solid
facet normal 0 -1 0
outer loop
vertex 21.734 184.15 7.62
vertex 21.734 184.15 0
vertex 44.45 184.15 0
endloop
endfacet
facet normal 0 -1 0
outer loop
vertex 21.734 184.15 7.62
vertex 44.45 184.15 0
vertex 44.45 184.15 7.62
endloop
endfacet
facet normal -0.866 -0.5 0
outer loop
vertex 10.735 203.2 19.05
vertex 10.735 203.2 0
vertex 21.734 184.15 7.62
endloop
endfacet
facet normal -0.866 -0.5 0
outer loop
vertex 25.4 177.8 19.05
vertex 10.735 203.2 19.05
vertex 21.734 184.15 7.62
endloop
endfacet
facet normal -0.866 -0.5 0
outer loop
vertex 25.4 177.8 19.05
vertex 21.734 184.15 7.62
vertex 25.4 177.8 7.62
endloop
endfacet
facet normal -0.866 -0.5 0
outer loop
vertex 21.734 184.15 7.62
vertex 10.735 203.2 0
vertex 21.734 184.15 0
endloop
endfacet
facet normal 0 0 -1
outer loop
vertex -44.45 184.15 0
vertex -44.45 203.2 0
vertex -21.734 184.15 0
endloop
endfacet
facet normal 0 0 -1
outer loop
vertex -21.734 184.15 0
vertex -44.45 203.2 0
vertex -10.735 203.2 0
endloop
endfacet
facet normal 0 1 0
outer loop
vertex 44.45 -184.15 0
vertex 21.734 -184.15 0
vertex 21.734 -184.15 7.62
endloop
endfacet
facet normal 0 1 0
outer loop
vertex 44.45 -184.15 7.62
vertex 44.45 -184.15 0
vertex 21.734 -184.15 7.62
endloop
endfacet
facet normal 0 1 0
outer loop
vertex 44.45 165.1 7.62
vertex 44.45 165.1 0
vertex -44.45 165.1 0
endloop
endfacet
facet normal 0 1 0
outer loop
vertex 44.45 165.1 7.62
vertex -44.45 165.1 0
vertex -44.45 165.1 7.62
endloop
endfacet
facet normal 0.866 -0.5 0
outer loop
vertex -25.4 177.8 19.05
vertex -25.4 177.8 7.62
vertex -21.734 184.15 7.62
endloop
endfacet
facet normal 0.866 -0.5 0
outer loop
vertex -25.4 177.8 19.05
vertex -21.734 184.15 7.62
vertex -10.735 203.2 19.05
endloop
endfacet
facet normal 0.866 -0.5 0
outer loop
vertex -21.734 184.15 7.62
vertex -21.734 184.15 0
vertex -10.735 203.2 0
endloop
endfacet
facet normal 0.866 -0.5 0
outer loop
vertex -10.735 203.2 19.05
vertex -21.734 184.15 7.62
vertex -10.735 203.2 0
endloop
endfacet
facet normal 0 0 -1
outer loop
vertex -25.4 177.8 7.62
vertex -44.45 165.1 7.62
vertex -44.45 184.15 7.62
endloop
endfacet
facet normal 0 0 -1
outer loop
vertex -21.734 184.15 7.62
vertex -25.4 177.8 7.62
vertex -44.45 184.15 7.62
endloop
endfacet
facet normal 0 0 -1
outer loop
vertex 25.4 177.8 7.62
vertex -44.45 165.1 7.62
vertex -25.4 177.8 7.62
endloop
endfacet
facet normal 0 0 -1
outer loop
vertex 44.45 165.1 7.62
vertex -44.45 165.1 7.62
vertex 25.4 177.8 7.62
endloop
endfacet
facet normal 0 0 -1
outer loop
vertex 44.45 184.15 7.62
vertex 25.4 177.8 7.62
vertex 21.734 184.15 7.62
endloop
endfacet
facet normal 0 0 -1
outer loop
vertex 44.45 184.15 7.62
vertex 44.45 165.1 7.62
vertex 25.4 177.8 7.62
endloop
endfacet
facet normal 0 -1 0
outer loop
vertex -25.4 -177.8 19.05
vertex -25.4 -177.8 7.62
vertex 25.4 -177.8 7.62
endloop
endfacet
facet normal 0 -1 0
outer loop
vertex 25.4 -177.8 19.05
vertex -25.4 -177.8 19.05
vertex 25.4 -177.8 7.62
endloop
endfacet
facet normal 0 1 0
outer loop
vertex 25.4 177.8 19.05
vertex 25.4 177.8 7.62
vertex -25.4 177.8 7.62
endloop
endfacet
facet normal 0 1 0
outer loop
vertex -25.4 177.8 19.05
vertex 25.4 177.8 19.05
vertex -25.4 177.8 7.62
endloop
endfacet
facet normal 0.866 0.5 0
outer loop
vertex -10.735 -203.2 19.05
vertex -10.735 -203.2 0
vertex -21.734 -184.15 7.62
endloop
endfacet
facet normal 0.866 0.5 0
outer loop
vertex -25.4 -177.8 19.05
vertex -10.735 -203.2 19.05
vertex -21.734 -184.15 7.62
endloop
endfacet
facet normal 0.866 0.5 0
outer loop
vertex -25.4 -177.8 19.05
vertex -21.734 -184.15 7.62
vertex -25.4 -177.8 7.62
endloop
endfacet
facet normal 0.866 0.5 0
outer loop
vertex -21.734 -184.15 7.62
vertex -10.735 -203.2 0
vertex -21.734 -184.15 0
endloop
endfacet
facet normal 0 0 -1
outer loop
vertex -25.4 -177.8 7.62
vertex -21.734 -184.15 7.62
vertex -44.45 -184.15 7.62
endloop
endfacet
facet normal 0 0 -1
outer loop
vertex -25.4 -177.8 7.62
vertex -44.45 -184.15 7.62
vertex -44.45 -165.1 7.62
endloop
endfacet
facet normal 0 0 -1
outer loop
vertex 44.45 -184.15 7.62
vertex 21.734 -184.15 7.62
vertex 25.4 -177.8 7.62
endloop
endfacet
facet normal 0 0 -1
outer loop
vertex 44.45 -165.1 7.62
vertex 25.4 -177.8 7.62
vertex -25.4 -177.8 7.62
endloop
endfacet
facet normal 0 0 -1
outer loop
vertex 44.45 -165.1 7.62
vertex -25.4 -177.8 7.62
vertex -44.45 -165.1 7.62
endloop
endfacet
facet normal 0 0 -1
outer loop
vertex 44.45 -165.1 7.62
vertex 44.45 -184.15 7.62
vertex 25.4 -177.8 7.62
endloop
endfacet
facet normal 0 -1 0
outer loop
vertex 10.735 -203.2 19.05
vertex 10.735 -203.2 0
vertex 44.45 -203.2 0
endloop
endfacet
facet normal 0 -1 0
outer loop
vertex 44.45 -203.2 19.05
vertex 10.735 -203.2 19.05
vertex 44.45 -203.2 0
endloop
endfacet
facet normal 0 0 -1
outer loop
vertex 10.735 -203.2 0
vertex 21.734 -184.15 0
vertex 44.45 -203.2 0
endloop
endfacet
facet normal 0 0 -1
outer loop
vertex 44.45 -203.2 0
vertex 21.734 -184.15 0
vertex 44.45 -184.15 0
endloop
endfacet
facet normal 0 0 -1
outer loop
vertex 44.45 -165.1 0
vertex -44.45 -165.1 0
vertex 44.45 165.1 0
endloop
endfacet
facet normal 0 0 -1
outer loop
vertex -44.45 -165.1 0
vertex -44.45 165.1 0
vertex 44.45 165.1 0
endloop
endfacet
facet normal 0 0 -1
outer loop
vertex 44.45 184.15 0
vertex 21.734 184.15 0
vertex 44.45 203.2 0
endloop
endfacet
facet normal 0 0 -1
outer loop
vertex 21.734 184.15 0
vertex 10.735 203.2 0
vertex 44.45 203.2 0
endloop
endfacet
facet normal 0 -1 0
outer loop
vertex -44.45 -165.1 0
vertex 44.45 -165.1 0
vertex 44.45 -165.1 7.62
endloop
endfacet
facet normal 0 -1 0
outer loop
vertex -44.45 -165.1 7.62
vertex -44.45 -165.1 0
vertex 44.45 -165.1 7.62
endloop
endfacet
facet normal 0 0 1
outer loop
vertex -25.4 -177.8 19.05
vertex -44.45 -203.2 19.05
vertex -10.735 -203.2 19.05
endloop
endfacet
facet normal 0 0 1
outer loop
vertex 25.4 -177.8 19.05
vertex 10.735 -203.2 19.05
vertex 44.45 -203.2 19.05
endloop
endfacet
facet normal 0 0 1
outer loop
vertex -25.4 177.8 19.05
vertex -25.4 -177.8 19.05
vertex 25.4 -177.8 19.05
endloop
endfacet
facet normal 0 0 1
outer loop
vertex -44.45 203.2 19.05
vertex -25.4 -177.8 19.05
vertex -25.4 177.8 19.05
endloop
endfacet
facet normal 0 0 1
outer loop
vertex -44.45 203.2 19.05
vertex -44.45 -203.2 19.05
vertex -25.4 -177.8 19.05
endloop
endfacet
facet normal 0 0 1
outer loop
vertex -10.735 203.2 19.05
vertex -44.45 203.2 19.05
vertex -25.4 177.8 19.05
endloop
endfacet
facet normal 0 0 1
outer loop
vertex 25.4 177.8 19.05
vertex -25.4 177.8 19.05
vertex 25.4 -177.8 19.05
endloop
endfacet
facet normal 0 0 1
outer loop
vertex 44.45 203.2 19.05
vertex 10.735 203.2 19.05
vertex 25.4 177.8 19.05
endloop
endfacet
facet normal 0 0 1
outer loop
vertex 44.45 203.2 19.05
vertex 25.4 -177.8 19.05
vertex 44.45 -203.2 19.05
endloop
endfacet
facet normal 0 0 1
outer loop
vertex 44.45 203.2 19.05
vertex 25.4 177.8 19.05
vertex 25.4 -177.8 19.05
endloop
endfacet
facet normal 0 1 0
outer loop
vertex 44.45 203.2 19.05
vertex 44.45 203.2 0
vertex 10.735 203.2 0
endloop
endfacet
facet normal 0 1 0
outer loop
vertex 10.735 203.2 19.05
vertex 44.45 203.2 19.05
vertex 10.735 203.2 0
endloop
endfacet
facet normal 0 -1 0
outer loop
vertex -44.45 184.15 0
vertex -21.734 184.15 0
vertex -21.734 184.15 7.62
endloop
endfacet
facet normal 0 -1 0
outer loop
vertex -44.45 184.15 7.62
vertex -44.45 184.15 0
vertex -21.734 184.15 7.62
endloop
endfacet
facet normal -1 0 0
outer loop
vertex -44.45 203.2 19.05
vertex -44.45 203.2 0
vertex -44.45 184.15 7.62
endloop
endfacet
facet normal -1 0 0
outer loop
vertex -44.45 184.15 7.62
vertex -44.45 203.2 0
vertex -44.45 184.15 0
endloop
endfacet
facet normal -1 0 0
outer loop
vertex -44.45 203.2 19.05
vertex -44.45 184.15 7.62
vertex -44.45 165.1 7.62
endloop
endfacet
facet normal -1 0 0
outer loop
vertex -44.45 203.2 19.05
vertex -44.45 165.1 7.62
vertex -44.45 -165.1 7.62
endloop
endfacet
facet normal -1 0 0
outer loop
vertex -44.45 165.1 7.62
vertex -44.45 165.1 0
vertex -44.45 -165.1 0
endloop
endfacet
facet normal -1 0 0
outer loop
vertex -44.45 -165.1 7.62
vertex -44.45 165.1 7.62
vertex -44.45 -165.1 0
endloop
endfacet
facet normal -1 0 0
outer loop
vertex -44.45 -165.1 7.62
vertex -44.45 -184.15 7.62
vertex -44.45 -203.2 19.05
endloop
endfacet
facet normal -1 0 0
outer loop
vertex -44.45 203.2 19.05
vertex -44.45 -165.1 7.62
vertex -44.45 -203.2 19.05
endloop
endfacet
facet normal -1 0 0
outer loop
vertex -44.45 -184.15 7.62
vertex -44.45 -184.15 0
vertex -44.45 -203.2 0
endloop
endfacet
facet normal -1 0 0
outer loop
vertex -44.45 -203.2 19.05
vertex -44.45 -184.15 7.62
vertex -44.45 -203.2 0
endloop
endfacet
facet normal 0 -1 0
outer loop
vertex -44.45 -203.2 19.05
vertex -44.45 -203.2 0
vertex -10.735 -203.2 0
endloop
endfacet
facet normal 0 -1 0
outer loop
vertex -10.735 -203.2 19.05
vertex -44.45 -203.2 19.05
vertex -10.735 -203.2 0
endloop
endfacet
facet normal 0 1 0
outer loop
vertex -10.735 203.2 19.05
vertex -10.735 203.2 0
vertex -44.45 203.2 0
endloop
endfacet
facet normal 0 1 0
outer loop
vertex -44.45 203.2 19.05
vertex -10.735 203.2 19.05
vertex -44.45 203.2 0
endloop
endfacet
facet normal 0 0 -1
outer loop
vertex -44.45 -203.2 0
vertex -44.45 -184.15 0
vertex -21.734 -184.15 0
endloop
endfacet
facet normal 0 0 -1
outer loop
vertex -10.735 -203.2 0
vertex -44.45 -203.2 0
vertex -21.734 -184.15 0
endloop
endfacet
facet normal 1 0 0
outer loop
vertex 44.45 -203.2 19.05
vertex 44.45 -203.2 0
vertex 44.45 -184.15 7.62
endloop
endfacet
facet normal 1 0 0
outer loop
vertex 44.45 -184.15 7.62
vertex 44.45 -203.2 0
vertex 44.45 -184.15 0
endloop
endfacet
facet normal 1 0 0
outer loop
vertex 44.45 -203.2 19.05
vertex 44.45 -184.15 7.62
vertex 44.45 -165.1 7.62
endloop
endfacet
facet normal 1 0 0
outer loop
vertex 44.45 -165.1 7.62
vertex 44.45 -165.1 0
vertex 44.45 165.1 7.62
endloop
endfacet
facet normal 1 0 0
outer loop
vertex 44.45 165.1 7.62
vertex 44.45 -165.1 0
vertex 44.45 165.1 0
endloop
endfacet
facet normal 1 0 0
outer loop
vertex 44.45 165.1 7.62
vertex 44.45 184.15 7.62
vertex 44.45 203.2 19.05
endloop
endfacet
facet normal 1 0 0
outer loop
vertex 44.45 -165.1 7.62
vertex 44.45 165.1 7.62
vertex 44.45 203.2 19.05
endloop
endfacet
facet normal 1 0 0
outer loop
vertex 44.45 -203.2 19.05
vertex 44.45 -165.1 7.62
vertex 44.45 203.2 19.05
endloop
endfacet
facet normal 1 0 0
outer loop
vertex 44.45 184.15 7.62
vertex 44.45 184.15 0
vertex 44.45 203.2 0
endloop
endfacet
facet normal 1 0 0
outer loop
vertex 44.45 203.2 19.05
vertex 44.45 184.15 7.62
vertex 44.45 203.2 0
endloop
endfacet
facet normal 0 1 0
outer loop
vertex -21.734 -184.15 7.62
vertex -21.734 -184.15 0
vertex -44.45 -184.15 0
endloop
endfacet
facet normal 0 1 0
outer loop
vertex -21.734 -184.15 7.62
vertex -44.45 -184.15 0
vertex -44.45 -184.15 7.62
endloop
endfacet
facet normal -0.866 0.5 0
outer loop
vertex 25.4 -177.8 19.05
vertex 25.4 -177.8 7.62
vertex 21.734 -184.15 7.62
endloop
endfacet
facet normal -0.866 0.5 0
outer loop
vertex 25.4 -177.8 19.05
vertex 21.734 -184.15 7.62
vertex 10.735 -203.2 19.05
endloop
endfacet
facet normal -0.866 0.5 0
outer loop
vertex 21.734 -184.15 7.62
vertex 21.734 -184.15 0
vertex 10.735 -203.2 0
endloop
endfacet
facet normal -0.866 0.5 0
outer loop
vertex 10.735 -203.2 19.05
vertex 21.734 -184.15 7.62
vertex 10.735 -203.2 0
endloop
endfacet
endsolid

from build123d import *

# Parameters (mm, degrees)
F1_DEPTH = 19.05
F2_W     = 19.05
F2_H     = 7.62
F3_DEPTH = 88.901


with BuildPart() as f1:
    # F0 (on Top) → F1 (new body)
    with BuildSketch(Plane.XY):
        Polygon((44.45, -203.2), (44.45, 203.2), (10.735303, 203.2), (25.4, 177.8), (-25.4, 177.8), (-10.735303, 203.2), (-44.45, 203.2), (-44.45, -203.2), (-10.735303, -203.2), (-25.4, -177.8), (25.4, -177.8), (10.735303, -203.2), align=None)
    extrude(amount=F1_DEPTH)

    # F2 (on face) → F3 (cut, through all)
    with BuildSketch(Plane.YZ.offset(44.45)):
        with Locations((-174.625, 3.81)):
            Rectangle(F2_W, F2_H)
        with Locations((174.625, 3.81)):
            Rectangle(F2_W, F2_H)
    extrude(amount=-F3_DEPTH, mode=Mode.SUBTRACT)


solid = f1.part
